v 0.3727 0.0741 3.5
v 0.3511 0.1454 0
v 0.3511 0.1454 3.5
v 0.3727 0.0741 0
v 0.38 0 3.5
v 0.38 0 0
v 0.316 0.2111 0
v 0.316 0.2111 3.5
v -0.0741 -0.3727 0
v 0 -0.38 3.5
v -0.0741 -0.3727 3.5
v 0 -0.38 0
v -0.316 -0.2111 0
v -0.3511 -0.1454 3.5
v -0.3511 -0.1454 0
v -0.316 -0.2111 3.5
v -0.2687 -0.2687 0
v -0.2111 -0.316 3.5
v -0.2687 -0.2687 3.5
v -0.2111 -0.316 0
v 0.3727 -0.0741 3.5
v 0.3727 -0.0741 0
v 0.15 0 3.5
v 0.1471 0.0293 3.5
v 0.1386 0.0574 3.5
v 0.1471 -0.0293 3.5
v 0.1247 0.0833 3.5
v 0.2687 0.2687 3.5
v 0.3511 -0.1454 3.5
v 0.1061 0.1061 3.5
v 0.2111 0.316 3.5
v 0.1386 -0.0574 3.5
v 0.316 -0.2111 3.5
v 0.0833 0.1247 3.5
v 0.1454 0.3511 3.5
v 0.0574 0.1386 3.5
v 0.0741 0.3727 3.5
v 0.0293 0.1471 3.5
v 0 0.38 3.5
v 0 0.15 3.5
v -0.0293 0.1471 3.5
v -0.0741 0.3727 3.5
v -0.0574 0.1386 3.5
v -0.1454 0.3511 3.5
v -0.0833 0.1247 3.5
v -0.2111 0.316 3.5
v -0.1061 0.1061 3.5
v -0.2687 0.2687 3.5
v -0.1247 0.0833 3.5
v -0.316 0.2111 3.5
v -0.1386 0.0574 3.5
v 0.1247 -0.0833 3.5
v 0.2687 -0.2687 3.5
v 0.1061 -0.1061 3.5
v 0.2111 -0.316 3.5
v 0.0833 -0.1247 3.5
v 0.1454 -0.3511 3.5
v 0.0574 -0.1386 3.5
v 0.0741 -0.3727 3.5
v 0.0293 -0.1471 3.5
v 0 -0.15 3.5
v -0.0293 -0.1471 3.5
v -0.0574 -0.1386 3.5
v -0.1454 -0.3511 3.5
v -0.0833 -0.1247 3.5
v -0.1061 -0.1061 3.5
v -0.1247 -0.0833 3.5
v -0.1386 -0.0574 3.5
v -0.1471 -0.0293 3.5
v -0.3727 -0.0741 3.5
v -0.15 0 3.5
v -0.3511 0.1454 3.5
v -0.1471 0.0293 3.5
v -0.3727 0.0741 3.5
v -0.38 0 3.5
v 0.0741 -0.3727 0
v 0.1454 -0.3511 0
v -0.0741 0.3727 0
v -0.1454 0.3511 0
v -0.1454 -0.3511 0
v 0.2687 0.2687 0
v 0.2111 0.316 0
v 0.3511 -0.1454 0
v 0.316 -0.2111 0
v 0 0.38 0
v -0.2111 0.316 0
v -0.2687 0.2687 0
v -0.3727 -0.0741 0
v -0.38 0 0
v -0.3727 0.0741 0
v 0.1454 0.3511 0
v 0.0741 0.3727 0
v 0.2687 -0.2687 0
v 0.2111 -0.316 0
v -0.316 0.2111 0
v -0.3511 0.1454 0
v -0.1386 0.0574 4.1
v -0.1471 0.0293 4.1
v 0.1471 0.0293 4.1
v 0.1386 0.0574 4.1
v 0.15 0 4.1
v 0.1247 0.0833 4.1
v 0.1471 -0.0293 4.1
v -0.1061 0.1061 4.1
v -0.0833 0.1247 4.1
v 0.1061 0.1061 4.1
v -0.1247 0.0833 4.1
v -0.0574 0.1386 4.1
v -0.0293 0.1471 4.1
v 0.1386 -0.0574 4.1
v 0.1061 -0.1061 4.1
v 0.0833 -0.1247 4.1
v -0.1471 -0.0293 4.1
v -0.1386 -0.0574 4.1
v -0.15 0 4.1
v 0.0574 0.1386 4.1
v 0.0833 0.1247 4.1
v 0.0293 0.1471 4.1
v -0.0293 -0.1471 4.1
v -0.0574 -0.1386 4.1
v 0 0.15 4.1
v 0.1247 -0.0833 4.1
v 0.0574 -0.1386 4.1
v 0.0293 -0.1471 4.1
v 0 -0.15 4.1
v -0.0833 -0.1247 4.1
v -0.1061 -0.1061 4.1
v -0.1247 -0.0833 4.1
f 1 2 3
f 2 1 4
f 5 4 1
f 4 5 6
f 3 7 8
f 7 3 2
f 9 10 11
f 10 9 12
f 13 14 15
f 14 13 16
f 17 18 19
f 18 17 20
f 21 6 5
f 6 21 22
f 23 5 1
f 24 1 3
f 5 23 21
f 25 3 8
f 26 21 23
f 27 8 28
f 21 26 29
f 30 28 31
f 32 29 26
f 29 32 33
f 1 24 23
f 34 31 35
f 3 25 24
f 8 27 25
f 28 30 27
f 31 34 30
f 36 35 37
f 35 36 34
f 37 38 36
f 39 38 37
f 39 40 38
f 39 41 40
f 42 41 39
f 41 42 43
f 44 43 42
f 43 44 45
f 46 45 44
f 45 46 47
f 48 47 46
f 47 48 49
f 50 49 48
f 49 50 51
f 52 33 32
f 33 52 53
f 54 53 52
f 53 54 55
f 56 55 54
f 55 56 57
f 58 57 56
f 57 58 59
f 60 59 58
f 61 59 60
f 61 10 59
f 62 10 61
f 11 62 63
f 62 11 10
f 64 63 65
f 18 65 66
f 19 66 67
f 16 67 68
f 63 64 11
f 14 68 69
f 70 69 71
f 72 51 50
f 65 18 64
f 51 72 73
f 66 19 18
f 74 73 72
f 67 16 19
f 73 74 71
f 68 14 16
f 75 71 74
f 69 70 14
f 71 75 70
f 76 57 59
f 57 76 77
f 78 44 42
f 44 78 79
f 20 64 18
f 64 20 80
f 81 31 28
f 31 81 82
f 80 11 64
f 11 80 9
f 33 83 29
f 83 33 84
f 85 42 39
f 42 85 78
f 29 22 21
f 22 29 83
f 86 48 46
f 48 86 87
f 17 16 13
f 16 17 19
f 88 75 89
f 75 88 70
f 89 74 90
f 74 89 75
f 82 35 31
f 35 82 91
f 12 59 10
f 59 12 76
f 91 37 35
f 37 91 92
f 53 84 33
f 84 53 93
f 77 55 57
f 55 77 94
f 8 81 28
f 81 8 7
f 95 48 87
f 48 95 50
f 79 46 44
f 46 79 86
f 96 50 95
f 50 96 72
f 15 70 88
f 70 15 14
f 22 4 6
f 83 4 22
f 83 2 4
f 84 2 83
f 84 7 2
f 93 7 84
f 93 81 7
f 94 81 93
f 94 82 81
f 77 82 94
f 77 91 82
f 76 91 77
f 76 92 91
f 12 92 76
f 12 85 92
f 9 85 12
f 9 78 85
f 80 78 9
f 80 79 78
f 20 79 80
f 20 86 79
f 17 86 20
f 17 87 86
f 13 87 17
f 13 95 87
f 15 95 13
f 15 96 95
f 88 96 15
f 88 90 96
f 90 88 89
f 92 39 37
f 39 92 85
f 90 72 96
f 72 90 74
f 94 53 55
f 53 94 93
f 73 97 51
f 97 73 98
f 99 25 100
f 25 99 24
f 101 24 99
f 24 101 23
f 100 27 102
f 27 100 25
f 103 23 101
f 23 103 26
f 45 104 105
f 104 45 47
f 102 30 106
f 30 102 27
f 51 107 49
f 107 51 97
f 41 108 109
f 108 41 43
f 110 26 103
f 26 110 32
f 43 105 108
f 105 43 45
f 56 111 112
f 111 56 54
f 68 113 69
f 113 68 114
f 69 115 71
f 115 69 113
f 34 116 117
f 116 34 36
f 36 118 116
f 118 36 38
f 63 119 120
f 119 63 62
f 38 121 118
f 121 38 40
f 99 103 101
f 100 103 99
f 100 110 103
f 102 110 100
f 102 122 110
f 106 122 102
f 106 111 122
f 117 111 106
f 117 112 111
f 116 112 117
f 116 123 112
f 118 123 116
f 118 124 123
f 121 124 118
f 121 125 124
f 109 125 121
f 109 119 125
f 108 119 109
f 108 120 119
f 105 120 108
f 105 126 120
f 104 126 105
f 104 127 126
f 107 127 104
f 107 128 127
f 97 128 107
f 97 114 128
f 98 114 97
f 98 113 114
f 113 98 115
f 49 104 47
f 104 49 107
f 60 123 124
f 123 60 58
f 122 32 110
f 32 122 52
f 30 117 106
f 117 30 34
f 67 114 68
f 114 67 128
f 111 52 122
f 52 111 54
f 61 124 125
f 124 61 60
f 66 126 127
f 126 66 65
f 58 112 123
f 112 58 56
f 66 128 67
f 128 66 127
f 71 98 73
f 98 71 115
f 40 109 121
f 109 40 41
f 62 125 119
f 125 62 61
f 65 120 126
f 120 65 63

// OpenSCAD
// Parameters
body_diameter_mm = 0.76; //[0.38:1.52:0.01]
overall_height_mm = 4.7; //[2.35:9.4:0.05]
body_height_mm = 3.5; //[1.75:7:0.05]
actuator_height_mm = 1.2; //[0.6:2.4:0.05]
actuator_diameter_mm = 0.3; //[0.15:0.6:0.01]
connect_overlap_mm = 0.6; //[0.2:1.2:0.05]

// Toggle switch - complete geometry
module toggle() {
  union() {
    // Body
    color("DimGray") {
      translate([0, 0, body_height_mm / 2])
        cylinder(r=body_diameter_mm / 2, h=body_height_mm, center=true, $fn=32);
    }
    // Actuator Lever
    color("Silver") {
      translate([0, 0, body_height_mm + actuator_height_mm / 2 - connect_overlap_mm])
        cylinder(r=actuator_diameter_mm / 2, h=actuator_height_mm, center=true, $fn=32);
    }
  }
}

// Assembly
module assembly() {
  toggle();
}

assembly();
